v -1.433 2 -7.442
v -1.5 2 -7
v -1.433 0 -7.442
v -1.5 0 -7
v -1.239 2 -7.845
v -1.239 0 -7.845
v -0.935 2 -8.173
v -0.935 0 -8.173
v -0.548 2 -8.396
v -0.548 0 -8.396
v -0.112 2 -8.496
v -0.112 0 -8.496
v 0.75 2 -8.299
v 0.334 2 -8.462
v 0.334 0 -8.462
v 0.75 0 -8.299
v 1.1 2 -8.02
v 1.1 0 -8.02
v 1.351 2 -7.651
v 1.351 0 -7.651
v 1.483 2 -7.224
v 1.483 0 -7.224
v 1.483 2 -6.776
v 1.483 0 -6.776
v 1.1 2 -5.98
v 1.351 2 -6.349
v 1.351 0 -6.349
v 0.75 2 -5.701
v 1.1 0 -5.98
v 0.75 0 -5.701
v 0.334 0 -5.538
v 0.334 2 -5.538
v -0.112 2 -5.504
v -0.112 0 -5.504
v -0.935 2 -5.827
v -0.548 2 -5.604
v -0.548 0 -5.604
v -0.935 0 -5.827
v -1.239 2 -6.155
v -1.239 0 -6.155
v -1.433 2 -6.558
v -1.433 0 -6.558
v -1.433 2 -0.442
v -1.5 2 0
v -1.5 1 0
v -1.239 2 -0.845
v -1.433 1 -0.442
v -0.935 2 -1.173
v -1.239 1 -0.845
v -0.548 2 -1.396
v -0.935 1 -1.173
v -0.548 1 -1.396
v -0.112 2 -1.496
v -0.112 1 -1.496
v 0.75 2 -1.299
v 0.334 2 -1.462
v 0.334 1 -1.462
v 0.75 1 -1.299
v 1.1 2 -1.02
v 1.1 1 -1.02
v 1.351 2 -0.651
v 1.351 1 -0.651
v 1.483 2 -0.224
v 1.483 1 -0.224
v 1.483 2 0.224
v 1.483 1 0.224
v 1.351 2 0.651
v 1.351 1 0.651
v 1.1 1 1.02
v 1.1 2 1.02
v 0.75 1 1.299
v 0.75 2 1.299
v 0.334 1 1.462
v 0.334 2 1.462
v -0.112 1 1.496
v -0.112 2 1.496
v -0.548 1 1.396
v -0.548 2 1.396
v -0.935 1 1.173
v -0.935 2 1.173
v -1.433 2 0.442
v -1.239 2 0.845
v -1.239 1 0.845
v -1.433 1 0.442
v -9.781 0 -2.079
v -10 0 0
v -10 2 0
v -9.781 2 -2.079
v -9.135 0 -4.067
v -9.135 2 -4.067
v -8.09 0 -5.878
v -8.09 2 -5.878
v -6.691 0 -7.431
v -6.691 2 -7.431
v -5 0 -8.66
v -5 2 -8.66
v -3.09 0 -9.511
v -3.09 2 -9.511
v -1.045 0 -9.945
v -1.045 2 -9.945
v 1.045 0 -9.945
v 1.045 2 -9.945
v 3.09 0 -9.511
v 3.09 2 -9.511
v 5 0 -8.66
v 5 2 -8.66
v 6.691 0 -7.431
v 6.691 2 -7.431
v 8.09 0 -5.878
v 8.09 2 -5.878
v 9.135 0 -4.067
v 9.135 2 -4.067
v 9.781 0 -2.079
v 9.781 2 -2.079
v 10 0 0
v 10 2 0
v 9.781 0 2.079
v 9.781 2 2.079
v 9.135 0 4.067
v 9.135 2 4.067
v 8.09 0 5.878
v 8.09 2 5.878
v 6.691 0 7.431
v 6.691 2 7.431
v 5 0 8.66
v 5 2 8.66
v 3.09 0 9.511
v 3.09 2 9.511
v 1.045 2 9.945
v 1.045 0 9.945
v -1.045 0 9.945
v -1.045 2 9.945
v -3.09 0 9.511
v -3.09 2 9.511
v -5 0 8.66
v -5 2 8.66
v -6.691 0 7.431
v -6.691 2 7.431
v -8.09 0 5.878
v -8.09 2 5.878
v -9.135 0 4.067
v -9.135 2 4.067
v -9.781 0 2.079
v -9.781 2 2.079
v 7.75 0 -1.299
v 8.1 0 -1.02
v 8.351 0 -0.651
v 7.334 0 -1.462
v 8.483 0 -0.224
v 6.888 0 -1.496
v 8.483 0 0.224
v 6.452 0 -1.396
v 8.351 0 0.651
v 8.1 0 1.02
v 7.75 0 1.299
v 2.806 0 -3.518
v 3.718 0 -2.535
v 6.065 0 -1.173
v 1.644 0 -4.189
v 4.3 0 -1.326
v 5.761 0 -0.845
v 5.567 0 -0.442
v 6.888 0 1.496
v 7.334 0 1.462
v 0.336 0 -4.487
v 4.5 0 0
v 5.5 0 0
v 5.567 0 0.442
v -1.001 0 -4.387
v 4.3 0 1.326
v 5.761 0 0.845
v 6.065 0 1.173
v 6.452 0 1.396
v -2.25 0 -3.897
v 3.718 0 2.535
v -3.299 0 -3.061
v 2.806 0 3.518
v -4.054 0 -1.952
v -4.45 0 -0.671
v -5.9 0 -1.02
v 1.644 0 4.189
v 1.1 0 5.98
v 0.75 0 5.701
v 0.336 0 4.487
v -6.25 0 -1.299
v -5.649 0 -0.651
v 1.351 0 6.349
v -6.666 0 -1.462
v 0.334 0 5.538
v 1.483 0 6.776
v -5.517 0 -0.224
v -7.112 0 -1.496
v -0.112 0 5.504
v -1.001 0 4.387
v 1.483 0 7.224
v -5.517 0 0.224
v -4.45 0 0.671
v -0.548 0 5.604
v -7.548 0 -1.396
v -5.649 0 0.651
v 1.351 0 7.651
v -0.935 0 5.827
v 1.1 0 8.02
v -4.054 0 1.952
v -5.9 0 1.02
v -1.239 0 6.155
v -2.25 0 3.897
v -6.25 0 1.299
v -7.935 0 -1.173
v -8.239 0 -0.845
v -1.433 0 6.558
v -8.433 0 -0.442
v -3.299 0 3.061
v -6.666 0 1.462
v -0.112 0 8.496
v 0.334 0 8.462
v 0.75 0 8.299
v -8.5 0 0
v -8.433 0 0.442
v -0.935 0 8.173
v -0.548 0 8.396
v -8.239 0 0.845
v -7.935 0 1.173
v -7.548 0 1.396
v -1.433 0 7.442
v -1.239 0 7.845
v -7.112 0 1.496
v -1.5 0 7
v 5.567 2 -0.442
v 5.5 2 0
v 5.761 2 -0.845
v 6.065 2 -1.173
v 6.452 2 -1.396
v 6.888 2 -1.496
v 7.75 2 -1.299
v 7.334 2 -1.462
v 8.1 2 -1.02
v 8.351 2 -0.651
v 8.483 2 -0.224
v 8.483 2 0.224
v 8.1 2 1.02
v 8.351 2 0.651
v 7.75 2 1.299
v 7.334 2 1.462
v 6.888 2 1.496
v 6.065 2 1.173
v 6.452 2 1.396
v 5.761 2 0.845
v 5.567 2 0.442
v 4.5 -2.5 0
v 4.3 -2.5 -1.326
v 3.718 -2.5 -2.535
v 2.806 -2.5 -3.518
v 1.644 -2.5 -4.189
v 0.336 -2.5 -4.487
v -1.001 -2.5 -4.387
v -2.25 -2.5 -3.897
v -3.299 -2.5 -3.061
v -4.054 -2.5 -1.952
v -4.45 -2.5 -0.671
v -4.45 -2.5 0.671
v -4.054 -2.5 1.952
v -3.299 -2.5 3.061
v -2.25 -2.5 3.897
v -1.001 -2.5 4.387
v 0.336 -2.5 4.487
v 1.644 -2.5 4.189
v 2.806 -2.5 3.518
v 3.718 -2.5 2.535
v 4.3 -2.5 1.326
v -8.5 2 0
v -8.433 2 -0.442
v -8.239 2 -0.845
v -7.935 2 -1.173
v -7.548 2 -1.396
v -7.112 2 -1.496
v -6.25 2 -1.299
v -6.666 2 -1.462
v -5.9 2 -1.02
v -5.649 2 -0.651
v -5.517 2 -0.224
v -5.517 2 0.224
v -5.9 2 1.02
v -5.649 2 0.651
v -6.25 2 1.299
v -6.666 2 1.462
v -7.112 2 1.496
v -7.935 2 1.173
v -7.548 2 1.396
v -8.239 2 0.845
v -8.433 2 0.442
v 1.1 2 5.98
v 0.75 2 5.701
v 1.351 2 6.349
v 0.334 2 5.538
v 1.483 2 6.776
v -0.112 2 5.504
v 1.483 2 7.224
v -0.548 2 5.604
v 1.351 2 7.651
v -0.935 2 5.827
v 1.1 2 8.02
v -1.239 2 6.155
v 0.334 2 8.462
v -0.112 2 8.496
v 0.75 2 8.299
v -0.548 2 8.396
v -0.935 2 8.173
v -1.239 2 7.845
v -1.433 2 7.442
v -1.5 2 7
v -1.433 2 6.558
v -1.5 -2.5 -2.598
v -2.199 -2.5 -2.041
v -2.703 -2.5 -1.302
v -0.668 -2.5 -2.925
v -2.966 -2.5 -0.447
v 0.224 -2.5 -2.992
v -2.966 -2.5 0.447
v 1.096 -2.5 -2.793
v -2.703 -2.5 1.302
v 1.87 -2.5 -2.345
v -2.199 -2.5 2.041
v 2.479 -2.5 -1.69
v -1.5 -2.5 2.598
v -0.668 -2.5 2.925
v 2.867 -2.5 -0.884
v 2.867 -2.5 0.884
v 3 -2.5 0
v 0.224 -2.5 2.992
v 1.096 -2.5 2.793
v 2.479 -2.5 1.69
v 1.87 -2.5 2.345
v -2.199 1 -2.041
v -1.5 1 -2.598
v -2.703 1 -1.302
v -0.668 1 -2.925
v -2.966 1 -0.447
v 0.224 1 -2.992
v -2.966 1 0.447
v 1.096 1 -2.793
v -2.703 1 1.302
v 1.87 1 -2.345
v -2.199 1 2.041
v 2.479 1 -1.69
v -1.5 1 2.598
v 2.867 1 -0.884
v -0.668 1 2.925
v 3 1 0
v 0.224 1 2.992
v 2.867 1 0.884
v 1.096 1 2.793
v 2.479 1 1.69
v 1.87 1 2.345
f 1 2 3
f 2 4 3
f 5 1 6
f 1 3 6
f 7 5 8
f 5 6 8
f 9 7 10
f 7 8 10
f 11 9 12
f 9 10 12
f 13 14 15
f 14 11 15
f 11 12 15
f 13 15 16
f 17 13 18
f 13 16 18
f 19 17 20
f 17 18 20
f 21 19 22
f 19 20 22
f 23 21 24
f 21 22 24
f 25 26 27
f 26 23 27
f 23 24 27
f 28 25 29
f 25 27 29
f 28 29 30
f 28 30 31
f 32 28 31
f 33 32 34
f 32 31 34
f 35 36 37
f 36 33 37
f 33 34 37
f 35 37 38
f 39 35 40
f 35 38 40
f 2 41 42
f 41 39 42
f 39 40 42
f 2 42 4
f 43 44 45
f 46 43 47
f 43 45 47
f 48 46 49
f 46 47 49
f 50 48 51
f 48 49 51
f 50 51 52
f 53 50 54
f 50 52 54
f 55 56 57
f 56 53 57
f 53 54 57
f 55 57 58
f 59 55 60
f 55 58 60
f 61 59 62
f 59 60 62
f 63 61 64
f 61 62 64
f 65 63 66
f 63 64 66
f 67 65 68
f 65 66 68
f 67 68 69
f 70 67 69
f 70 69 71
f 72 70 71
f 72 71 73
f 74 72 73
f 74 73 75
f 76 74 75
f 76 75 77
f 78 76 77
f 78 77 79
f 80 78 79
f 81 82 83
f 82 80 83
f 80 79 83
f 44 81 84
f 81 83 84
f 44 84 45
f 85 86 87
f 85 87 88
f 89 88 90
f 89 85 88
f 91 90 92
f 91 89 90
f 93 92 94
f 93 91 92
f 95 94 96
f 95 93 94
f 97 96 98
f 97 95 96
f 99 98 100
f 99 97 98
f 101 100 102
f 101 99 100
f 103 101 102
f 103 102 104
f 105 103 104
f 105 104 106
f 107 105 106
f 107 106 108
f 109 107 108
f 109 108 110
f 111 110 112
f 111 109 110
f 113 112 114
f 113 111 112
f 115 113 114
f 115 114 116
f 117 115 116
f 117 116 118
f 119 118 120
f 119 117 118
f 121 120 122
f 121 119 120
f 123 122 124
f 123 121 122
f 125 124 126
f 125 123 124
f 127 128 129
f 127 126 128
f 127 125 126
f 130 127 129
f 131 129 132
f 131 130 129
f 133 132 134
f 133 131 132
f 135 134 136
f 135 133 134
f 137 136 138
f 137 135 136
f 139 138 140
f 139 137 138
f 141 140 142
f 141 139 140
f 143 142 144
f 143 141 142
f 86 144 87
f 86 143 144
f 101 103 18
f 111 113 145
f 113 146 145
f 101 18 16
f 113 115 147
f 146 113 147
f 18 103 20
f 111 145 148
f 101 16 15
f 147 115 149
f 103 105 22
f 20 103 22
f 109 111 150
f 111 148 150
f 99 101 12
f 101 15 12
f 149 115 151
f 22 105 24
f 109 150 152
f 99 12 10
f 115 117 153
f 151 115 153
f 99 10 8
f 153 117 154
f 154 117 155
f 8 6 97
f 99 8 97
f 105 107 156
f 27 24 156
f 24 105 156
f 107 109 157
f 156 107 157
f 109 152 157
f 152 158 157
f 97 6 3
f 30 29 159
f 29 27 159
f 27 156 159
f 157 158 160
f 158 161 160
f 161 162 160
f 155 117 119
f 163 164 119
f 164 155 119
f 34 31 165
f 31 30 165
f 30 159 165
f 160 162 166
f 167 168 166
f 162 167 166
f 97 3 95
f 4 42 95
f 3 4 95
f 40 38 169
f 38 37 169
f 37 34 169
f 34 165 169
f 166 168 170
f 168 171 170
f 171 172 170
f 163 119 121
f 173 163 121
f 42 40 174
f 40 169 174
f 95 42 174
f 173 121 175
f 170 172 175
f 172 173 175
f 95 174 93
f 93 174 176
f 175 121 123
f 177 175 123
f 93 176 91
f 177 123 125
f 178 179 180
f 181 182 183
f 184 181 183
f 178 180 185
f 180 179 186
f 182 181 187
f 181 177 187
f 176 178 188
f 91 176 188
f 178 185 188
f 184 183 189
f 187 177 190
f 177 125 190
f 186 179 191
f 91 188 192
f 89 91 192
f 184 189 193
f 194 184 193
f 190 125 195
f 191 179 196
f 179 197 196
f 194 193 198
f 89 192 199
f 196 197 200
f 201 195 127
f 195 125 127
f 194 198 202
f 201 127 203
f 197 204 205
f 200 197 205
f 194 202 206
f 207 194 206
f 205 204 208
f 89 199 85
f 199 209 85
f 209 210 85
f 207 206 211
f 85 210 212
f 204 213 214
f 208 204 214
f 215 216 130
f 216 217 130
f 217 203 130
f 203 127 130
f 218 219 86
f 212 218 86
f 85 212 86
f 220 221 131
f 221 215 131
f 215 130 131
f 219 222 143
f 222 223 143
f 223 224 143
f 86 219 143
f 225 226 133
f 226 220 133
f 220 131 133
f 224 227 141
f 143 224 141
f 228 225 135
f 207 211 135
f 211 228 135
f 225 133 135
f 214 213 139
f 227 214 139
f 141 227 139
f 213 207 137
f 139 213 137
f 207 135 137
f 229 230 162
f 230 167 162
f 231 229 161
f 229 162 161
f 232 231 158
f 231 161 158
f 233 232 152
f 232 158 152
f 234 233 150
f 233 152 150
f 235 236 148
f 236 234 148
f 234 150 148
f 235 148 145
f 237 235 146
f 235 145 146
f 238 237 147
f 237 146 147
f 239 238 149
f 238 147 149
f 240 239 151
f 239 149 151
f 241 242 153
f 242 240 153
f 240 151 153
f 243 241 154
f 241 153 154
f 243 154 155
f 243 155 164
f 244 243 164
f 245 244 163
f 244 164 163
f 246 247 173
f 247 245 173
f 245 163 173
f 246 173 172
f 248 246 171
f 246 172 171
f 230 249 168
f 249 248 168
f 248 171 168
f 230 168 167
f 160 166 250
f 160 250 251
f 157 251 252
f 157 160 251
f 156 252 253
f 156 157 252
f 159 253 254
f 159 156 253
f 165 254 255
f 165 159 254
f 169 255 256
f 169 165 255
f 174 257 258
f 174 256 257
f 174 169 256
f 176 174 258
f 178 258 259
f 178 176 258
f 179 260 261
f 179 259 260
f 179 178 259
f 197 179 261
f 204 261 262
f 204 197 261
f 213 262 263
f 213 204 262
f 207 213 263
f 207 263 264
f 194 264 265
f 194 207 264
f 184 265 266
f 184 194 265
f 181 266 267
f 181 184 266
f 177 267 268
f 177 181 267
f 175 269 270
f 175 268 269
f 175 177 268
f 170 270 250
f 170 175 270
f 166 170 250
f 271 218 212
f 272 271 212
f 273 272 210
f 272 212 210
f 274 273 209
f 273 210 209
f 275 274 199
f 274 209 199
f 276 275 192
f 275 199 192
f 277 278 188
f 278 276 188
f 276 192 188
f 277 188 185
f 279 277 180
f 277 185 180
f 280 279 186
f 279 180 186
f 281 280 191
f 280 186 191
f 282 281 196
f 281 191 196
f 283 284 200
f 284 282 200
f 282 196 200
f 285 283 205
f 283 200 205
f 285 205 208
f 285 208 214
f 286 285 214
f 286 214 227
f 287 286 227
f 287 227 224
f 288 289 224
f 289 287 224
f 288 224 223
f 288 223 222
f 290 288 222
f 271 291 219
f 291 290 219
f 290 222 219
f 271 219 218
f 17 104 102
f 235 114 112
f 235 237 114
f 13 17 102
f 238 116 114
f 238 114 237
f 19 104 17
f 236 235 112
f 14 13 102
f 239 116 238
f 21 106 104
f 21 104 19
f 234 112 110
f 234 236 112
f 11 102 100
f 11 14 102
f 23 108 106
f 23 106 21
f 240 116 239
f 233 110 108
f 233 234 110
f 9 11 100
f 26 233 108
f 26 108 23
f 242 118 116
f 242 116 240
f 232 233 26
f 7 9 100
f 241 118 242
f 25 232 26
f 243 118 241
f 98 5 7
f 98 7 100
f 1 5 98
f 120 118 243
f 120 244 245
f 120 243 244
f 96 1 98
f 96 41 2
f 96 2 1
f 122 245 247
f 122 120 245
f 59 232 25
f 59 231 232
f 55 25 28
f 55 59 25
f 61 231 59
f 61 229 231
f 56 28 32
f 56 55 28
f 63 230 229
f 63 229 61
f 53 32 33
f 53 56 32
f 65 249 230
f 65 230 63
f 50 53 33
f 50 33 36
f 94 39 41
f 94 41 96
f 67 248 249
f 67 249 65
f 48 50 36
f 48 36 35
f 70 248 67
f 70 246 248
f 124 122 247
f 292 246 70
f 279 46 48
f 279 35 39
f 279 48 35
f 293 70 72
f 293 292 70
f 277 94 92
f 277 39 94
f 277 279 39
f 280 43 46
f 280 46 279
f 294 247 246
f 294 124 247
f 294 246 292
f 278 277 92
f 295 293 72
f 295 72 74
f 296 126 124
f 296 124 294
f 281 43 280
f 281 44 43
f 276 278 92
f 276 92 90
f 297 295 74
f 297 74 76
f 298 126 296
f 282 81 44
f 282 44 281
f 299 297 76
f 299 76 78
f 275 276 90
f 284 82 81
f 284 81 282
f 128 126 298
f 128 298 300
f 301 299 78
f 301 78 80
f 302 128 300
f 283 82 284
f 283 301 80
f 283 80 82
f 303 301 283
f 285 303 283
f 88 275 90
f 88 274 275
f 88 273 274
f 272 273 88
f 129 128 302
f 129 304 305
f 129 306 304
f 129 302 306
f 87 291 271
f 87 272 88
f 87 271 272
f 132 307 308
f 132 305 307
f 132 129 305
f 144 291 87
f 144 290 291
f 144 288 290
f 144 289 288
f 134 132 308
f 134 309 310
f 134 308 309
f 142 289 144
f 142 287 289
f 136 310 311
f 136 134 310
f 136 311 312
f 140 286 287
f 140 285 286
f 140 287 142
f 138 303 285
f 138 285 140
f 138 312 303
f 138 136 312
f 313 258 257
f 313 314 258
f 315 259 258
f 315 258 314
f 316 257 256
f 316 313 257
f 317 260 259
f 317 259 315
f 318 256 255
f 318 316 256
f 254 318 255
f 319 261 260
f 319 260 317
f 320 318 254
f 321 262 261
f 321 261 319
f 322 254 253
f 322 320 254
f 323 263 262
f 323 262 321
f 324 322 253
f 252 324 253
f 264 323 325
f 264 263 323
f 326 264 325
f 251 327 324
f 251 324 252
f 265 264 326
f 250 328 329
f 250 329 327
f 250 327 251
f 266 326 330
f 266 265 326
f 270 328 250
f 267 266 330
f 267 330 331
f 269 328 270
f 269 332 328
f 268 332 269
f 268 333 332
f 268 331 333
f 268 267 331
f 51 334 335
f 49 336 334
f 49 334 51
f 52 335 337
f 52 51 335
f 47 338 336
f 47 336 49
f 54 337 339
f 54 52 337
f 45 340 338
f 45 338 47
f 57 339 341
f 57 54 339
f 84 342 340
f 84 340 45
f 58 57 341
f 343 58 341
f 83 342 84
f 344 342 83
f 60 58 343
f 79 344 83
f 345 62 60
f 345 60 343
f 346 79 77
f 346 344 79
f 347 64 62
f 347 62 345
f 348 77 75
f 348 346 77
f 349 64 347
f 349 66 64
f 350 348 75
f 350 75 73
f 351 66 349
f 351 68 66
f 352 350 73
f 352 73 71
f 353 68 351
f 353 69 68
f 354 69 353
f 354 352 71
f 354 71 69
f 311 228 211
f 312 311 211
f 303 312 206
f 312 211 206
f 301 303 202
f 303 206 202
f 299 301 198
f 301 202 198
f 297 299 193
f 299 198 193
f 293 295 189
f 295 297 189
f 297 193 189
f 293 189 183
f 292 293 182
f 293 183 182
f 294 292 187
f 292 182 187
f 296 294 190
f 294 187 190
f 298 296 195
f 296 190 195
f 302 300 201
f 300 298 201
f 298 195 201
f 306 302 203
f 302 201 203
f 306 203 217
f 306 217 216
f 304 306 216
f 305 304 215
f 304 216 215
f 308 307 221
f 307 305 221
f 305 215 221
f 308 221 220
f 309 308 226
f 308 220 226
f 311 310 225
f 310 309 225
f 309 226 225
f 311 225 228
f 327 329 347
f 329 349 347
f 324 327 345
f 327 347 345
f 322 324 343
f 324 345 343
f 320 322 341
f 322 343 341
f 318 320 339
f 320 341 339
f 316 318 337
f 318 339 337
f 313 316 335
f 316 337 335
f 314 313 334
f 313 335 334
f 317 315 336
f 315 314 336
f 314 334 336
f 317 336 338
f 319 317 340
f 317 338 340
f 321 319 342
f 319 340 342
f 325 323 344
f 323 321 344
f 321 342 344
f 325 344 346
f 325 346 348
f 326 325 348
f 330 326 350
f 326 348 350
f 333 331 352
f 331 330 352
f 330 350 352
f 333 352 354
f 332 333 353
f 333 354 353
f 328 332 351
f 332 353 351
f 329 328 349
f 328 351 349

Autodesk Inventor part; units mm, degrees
ref_plane "YZ Plane" through (0, 0, 0) normal (1, 0, 0) x (0, 1, 0)
ref_plane "XZ Plane" through (0, 0, 0) normal (0, 1, 0) x (-1, 0, 0)
ref_plane "XY Plane" through (0, 0, 0) normal (0, 0, 1) x (1, 0, 0)
sketch "Эскиз1" plane through (0, 0, 0) normal (0, 1, 0) x (-1, 0, 0)
  circle A0 centre (0, 0) radius 10
  circle A1 centre (0, 0) radius 1.5
  circle A2 centre (7, 0) radius 1.5
  circle A3 centre (0, -7) radius 1.5
  circle A4 centre (-7, 0) radius 1.5
  circle A5 centre (0, 7) radius 1.5
  dimension "d0" = 20
  dimension "d1" = 3
  dimension "d2" = 3
  dimension "d3" = 3
  dimension "d4" = 3
  dimension "d5" = 3
  dimension "d6" = 7
  dimension "d7" = 7
  dimension "d8" = 7
  dimension "d9" = 7
extrude "Выдавливание1" add sketch "Эскиз1" along normal blind 2
sketch "Эскиз2" plane through (0, 0, 0) normal (0, -1, 0) x (1, 0, 0)
  circle A0 centre (0, 0) radius 1.5 projected
  circle A1 centre (0, 0) radius 3
  circle A2 centre (0, 0) radius 4.5
  dimension "d12" = 6
  dimension "d13" = 9
extrude "Выдавливание2" add sketch "Эскиз2" along normal blind 2.5 contours A2
sketch "Эскиз3" plane through (0, 0, 0) normal (0, -1, 0) x (1, 0, 0)
  circle A0 centre (0, 0) radius 1.5 projected
  circle A1 centre (0, 0) radius 3
extrude "Выдавливание3" cut sketch "Эскиз3" against normal blind 1
properties part number "MG996R_nozzle"
